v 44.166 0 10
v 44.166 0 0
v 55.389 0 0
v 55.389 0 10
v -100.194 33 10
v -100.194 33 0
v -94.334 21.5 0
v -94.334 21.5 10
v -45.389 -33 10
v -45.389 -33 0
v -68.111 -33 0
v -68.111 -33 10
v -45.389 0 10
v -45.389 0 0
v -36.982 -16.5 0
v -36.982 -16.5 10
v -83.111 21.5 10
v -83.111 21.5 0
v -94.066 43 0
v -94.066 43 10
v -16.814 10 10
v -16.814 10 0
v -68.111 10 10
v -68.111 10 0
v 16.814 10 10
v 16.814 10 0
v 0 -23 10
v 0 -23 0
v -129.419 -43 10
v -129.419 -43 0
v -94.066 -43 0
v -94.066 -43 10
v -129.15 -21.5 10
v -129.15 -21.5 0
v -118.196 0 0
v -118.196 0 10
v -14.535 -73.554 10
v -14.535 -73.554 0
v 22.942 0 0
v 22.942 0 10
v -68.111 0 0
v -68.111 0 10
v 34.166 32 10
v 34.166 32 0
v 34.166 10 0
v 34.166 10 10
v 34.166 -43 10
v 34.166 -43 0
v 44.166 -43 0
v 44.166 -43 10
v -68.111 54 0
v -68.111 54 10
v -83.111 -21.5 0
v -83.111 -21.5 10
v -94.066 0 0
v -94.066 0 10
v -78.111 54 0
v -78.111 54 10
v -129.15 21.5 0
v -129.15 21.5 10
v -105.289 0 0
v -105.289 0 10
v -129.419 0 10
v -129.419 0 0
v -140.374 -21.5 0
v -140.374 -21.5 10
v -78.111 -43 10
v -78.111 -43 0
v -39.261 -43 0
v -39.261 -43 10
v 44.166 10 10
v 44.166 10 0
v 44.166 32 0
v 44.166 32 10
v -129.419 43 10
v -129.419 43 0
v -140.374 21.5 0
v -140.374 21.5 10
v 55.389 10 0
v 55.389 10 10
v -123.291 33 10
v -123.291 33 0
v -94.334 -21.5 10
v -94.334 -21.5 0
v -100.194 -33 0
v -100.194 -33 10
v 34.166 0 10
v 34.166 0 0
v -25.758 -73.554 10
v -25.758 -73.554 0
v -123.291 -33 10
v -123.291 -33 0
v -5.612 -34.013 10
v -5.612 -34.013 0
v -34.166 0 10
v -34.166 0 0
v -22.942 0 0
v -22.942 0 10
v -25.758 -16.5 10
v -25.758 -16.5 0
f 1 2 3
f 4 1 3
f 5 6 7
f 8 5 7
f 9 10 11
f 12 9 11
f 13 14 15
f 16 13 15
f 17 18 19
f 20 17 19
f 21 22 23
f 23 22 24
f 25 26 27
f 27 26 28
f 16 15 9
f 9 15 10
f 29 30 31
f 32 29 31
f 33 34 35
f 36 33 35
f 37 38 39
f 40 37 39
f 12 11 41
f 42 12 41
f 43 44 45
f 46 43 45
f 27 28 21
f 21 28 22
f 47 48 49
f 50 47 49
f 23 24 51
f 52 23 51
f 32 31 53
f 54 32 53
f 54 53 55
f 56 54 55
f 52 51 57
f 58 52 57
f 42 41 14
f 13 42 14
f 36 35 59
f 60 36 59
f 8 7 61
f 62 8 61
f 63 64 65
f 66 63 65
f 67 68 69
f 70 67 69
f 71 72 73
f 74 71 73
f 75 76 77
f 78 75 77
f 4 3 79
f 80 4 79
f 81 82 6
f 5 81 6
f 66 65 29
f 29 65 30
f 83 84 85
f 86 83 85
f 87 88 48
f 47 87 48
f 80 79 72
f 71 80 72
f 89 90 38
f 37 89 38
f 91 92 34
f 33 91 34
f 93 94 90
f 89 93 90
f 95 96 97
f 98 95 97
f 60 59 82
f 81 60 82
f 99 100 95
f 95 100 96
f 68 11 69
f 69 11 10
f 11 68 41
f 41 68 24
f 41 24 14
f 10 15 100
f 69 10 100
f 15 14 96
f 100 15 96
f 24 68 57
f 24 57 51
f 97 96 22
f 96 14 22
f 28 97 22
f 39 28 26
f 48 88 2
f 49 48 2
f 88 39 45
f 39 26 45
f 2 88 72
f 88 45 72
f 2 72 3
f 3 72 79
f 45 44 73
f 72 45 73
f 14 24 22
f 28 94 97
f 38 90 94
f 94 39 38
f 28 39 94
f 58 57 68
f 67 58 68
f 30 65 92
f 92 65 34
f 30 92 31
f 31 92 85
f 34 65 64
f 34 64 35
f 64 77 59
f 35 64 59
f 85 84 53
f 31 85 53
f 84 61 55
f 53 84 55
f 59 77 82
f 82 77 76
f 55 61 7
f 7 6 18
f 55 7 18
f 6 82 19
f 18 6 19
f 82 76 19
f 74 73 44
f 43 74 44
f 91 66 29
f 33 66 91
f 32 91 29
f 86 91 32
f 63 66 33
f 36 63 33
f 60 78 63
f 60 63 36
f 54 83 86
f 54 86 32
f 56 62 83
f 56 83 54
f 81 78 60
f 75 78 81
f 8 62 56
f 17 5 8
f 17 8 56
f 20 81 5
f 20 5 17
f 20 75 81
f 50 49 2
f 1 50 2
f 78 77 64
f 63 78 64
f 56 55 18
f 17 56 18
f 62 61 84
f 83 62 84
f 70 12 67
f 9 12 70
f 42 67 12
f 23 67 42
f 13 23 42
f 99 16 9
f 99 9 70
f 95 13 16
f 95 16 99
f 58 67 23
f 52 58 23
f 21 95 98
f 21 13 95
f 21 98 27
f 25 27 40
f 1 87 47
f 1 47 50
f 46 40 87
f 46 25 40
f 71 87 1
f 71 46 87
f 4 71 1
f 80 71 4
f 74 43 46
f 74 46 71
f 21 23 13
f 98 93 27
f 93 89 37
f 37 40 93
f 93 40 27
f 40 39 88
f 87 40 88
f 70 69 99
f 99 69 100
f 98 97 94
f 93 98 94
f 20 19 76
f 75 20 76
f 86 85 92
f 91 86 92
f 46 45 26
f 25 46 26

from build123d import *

# Parameters (mm, degrees)
F1_DEPTH = 10


with BuildPart() as f1:
    # F0 (on Top) → F1 (new body)
    with BuildSketch(Plane.XY):
        Polygon((44.16561, 32), (34.16561, 32), (34.16561, 10), (16.81434, 10), (0, -23), (-16.81434, 10), (-28.037602, 10), (-68.11084, 10), (-68.11084, 54), (-78.11084, 54), (-78.11084, 10), (-78.11084, -43), (-39.260865, -43), (-25.75844, -16.5), (-34.16561, 0), (-22.942348, 0), (-5.611631, -34.013446), (-25.75844, -73.553785), (-14.535178, -73.553785), (22.942348, 0), (34.16561, 0), (34.16561, -43), (44.16561, -43), (44.16561, 0), (55.388872, 0), (55.388872, 10), (44.16561, 10), align=None)
        Polygon((-45.388872, -33), (-68.11084, -33), (-68.11084, -16.5), (-68.11084, 0), (-45.388872, 0), (-36.981703, -16.5), align=None, mode=Mode.SUBTRACT)
        Polygon((-129.418914, -43), (-94.065638, -43), (-83.11084, -21.5), (-94.065638, 0), (-83.11084, 21.5), (-94.065638, 43), (-129.418914, 43), (-140.373711, 21.5), (-129.418914, 0), (-140.373711, -21.5), align=None)
        Polygon((-118.195652, 0), (-129.150449, 21.5), (-123.290906, 33), (-100.193645, 33), (-94.334103, 21.5), (-105.2889, 0), (-94.334103, -21.5), (-100.193645, -33), (-123.290906, -33), (-129.150449, -21.5), align=None, mode=Mode.SUBTRACT)
    extrude(amount=F1_DEPTH)


solid = f1.part
